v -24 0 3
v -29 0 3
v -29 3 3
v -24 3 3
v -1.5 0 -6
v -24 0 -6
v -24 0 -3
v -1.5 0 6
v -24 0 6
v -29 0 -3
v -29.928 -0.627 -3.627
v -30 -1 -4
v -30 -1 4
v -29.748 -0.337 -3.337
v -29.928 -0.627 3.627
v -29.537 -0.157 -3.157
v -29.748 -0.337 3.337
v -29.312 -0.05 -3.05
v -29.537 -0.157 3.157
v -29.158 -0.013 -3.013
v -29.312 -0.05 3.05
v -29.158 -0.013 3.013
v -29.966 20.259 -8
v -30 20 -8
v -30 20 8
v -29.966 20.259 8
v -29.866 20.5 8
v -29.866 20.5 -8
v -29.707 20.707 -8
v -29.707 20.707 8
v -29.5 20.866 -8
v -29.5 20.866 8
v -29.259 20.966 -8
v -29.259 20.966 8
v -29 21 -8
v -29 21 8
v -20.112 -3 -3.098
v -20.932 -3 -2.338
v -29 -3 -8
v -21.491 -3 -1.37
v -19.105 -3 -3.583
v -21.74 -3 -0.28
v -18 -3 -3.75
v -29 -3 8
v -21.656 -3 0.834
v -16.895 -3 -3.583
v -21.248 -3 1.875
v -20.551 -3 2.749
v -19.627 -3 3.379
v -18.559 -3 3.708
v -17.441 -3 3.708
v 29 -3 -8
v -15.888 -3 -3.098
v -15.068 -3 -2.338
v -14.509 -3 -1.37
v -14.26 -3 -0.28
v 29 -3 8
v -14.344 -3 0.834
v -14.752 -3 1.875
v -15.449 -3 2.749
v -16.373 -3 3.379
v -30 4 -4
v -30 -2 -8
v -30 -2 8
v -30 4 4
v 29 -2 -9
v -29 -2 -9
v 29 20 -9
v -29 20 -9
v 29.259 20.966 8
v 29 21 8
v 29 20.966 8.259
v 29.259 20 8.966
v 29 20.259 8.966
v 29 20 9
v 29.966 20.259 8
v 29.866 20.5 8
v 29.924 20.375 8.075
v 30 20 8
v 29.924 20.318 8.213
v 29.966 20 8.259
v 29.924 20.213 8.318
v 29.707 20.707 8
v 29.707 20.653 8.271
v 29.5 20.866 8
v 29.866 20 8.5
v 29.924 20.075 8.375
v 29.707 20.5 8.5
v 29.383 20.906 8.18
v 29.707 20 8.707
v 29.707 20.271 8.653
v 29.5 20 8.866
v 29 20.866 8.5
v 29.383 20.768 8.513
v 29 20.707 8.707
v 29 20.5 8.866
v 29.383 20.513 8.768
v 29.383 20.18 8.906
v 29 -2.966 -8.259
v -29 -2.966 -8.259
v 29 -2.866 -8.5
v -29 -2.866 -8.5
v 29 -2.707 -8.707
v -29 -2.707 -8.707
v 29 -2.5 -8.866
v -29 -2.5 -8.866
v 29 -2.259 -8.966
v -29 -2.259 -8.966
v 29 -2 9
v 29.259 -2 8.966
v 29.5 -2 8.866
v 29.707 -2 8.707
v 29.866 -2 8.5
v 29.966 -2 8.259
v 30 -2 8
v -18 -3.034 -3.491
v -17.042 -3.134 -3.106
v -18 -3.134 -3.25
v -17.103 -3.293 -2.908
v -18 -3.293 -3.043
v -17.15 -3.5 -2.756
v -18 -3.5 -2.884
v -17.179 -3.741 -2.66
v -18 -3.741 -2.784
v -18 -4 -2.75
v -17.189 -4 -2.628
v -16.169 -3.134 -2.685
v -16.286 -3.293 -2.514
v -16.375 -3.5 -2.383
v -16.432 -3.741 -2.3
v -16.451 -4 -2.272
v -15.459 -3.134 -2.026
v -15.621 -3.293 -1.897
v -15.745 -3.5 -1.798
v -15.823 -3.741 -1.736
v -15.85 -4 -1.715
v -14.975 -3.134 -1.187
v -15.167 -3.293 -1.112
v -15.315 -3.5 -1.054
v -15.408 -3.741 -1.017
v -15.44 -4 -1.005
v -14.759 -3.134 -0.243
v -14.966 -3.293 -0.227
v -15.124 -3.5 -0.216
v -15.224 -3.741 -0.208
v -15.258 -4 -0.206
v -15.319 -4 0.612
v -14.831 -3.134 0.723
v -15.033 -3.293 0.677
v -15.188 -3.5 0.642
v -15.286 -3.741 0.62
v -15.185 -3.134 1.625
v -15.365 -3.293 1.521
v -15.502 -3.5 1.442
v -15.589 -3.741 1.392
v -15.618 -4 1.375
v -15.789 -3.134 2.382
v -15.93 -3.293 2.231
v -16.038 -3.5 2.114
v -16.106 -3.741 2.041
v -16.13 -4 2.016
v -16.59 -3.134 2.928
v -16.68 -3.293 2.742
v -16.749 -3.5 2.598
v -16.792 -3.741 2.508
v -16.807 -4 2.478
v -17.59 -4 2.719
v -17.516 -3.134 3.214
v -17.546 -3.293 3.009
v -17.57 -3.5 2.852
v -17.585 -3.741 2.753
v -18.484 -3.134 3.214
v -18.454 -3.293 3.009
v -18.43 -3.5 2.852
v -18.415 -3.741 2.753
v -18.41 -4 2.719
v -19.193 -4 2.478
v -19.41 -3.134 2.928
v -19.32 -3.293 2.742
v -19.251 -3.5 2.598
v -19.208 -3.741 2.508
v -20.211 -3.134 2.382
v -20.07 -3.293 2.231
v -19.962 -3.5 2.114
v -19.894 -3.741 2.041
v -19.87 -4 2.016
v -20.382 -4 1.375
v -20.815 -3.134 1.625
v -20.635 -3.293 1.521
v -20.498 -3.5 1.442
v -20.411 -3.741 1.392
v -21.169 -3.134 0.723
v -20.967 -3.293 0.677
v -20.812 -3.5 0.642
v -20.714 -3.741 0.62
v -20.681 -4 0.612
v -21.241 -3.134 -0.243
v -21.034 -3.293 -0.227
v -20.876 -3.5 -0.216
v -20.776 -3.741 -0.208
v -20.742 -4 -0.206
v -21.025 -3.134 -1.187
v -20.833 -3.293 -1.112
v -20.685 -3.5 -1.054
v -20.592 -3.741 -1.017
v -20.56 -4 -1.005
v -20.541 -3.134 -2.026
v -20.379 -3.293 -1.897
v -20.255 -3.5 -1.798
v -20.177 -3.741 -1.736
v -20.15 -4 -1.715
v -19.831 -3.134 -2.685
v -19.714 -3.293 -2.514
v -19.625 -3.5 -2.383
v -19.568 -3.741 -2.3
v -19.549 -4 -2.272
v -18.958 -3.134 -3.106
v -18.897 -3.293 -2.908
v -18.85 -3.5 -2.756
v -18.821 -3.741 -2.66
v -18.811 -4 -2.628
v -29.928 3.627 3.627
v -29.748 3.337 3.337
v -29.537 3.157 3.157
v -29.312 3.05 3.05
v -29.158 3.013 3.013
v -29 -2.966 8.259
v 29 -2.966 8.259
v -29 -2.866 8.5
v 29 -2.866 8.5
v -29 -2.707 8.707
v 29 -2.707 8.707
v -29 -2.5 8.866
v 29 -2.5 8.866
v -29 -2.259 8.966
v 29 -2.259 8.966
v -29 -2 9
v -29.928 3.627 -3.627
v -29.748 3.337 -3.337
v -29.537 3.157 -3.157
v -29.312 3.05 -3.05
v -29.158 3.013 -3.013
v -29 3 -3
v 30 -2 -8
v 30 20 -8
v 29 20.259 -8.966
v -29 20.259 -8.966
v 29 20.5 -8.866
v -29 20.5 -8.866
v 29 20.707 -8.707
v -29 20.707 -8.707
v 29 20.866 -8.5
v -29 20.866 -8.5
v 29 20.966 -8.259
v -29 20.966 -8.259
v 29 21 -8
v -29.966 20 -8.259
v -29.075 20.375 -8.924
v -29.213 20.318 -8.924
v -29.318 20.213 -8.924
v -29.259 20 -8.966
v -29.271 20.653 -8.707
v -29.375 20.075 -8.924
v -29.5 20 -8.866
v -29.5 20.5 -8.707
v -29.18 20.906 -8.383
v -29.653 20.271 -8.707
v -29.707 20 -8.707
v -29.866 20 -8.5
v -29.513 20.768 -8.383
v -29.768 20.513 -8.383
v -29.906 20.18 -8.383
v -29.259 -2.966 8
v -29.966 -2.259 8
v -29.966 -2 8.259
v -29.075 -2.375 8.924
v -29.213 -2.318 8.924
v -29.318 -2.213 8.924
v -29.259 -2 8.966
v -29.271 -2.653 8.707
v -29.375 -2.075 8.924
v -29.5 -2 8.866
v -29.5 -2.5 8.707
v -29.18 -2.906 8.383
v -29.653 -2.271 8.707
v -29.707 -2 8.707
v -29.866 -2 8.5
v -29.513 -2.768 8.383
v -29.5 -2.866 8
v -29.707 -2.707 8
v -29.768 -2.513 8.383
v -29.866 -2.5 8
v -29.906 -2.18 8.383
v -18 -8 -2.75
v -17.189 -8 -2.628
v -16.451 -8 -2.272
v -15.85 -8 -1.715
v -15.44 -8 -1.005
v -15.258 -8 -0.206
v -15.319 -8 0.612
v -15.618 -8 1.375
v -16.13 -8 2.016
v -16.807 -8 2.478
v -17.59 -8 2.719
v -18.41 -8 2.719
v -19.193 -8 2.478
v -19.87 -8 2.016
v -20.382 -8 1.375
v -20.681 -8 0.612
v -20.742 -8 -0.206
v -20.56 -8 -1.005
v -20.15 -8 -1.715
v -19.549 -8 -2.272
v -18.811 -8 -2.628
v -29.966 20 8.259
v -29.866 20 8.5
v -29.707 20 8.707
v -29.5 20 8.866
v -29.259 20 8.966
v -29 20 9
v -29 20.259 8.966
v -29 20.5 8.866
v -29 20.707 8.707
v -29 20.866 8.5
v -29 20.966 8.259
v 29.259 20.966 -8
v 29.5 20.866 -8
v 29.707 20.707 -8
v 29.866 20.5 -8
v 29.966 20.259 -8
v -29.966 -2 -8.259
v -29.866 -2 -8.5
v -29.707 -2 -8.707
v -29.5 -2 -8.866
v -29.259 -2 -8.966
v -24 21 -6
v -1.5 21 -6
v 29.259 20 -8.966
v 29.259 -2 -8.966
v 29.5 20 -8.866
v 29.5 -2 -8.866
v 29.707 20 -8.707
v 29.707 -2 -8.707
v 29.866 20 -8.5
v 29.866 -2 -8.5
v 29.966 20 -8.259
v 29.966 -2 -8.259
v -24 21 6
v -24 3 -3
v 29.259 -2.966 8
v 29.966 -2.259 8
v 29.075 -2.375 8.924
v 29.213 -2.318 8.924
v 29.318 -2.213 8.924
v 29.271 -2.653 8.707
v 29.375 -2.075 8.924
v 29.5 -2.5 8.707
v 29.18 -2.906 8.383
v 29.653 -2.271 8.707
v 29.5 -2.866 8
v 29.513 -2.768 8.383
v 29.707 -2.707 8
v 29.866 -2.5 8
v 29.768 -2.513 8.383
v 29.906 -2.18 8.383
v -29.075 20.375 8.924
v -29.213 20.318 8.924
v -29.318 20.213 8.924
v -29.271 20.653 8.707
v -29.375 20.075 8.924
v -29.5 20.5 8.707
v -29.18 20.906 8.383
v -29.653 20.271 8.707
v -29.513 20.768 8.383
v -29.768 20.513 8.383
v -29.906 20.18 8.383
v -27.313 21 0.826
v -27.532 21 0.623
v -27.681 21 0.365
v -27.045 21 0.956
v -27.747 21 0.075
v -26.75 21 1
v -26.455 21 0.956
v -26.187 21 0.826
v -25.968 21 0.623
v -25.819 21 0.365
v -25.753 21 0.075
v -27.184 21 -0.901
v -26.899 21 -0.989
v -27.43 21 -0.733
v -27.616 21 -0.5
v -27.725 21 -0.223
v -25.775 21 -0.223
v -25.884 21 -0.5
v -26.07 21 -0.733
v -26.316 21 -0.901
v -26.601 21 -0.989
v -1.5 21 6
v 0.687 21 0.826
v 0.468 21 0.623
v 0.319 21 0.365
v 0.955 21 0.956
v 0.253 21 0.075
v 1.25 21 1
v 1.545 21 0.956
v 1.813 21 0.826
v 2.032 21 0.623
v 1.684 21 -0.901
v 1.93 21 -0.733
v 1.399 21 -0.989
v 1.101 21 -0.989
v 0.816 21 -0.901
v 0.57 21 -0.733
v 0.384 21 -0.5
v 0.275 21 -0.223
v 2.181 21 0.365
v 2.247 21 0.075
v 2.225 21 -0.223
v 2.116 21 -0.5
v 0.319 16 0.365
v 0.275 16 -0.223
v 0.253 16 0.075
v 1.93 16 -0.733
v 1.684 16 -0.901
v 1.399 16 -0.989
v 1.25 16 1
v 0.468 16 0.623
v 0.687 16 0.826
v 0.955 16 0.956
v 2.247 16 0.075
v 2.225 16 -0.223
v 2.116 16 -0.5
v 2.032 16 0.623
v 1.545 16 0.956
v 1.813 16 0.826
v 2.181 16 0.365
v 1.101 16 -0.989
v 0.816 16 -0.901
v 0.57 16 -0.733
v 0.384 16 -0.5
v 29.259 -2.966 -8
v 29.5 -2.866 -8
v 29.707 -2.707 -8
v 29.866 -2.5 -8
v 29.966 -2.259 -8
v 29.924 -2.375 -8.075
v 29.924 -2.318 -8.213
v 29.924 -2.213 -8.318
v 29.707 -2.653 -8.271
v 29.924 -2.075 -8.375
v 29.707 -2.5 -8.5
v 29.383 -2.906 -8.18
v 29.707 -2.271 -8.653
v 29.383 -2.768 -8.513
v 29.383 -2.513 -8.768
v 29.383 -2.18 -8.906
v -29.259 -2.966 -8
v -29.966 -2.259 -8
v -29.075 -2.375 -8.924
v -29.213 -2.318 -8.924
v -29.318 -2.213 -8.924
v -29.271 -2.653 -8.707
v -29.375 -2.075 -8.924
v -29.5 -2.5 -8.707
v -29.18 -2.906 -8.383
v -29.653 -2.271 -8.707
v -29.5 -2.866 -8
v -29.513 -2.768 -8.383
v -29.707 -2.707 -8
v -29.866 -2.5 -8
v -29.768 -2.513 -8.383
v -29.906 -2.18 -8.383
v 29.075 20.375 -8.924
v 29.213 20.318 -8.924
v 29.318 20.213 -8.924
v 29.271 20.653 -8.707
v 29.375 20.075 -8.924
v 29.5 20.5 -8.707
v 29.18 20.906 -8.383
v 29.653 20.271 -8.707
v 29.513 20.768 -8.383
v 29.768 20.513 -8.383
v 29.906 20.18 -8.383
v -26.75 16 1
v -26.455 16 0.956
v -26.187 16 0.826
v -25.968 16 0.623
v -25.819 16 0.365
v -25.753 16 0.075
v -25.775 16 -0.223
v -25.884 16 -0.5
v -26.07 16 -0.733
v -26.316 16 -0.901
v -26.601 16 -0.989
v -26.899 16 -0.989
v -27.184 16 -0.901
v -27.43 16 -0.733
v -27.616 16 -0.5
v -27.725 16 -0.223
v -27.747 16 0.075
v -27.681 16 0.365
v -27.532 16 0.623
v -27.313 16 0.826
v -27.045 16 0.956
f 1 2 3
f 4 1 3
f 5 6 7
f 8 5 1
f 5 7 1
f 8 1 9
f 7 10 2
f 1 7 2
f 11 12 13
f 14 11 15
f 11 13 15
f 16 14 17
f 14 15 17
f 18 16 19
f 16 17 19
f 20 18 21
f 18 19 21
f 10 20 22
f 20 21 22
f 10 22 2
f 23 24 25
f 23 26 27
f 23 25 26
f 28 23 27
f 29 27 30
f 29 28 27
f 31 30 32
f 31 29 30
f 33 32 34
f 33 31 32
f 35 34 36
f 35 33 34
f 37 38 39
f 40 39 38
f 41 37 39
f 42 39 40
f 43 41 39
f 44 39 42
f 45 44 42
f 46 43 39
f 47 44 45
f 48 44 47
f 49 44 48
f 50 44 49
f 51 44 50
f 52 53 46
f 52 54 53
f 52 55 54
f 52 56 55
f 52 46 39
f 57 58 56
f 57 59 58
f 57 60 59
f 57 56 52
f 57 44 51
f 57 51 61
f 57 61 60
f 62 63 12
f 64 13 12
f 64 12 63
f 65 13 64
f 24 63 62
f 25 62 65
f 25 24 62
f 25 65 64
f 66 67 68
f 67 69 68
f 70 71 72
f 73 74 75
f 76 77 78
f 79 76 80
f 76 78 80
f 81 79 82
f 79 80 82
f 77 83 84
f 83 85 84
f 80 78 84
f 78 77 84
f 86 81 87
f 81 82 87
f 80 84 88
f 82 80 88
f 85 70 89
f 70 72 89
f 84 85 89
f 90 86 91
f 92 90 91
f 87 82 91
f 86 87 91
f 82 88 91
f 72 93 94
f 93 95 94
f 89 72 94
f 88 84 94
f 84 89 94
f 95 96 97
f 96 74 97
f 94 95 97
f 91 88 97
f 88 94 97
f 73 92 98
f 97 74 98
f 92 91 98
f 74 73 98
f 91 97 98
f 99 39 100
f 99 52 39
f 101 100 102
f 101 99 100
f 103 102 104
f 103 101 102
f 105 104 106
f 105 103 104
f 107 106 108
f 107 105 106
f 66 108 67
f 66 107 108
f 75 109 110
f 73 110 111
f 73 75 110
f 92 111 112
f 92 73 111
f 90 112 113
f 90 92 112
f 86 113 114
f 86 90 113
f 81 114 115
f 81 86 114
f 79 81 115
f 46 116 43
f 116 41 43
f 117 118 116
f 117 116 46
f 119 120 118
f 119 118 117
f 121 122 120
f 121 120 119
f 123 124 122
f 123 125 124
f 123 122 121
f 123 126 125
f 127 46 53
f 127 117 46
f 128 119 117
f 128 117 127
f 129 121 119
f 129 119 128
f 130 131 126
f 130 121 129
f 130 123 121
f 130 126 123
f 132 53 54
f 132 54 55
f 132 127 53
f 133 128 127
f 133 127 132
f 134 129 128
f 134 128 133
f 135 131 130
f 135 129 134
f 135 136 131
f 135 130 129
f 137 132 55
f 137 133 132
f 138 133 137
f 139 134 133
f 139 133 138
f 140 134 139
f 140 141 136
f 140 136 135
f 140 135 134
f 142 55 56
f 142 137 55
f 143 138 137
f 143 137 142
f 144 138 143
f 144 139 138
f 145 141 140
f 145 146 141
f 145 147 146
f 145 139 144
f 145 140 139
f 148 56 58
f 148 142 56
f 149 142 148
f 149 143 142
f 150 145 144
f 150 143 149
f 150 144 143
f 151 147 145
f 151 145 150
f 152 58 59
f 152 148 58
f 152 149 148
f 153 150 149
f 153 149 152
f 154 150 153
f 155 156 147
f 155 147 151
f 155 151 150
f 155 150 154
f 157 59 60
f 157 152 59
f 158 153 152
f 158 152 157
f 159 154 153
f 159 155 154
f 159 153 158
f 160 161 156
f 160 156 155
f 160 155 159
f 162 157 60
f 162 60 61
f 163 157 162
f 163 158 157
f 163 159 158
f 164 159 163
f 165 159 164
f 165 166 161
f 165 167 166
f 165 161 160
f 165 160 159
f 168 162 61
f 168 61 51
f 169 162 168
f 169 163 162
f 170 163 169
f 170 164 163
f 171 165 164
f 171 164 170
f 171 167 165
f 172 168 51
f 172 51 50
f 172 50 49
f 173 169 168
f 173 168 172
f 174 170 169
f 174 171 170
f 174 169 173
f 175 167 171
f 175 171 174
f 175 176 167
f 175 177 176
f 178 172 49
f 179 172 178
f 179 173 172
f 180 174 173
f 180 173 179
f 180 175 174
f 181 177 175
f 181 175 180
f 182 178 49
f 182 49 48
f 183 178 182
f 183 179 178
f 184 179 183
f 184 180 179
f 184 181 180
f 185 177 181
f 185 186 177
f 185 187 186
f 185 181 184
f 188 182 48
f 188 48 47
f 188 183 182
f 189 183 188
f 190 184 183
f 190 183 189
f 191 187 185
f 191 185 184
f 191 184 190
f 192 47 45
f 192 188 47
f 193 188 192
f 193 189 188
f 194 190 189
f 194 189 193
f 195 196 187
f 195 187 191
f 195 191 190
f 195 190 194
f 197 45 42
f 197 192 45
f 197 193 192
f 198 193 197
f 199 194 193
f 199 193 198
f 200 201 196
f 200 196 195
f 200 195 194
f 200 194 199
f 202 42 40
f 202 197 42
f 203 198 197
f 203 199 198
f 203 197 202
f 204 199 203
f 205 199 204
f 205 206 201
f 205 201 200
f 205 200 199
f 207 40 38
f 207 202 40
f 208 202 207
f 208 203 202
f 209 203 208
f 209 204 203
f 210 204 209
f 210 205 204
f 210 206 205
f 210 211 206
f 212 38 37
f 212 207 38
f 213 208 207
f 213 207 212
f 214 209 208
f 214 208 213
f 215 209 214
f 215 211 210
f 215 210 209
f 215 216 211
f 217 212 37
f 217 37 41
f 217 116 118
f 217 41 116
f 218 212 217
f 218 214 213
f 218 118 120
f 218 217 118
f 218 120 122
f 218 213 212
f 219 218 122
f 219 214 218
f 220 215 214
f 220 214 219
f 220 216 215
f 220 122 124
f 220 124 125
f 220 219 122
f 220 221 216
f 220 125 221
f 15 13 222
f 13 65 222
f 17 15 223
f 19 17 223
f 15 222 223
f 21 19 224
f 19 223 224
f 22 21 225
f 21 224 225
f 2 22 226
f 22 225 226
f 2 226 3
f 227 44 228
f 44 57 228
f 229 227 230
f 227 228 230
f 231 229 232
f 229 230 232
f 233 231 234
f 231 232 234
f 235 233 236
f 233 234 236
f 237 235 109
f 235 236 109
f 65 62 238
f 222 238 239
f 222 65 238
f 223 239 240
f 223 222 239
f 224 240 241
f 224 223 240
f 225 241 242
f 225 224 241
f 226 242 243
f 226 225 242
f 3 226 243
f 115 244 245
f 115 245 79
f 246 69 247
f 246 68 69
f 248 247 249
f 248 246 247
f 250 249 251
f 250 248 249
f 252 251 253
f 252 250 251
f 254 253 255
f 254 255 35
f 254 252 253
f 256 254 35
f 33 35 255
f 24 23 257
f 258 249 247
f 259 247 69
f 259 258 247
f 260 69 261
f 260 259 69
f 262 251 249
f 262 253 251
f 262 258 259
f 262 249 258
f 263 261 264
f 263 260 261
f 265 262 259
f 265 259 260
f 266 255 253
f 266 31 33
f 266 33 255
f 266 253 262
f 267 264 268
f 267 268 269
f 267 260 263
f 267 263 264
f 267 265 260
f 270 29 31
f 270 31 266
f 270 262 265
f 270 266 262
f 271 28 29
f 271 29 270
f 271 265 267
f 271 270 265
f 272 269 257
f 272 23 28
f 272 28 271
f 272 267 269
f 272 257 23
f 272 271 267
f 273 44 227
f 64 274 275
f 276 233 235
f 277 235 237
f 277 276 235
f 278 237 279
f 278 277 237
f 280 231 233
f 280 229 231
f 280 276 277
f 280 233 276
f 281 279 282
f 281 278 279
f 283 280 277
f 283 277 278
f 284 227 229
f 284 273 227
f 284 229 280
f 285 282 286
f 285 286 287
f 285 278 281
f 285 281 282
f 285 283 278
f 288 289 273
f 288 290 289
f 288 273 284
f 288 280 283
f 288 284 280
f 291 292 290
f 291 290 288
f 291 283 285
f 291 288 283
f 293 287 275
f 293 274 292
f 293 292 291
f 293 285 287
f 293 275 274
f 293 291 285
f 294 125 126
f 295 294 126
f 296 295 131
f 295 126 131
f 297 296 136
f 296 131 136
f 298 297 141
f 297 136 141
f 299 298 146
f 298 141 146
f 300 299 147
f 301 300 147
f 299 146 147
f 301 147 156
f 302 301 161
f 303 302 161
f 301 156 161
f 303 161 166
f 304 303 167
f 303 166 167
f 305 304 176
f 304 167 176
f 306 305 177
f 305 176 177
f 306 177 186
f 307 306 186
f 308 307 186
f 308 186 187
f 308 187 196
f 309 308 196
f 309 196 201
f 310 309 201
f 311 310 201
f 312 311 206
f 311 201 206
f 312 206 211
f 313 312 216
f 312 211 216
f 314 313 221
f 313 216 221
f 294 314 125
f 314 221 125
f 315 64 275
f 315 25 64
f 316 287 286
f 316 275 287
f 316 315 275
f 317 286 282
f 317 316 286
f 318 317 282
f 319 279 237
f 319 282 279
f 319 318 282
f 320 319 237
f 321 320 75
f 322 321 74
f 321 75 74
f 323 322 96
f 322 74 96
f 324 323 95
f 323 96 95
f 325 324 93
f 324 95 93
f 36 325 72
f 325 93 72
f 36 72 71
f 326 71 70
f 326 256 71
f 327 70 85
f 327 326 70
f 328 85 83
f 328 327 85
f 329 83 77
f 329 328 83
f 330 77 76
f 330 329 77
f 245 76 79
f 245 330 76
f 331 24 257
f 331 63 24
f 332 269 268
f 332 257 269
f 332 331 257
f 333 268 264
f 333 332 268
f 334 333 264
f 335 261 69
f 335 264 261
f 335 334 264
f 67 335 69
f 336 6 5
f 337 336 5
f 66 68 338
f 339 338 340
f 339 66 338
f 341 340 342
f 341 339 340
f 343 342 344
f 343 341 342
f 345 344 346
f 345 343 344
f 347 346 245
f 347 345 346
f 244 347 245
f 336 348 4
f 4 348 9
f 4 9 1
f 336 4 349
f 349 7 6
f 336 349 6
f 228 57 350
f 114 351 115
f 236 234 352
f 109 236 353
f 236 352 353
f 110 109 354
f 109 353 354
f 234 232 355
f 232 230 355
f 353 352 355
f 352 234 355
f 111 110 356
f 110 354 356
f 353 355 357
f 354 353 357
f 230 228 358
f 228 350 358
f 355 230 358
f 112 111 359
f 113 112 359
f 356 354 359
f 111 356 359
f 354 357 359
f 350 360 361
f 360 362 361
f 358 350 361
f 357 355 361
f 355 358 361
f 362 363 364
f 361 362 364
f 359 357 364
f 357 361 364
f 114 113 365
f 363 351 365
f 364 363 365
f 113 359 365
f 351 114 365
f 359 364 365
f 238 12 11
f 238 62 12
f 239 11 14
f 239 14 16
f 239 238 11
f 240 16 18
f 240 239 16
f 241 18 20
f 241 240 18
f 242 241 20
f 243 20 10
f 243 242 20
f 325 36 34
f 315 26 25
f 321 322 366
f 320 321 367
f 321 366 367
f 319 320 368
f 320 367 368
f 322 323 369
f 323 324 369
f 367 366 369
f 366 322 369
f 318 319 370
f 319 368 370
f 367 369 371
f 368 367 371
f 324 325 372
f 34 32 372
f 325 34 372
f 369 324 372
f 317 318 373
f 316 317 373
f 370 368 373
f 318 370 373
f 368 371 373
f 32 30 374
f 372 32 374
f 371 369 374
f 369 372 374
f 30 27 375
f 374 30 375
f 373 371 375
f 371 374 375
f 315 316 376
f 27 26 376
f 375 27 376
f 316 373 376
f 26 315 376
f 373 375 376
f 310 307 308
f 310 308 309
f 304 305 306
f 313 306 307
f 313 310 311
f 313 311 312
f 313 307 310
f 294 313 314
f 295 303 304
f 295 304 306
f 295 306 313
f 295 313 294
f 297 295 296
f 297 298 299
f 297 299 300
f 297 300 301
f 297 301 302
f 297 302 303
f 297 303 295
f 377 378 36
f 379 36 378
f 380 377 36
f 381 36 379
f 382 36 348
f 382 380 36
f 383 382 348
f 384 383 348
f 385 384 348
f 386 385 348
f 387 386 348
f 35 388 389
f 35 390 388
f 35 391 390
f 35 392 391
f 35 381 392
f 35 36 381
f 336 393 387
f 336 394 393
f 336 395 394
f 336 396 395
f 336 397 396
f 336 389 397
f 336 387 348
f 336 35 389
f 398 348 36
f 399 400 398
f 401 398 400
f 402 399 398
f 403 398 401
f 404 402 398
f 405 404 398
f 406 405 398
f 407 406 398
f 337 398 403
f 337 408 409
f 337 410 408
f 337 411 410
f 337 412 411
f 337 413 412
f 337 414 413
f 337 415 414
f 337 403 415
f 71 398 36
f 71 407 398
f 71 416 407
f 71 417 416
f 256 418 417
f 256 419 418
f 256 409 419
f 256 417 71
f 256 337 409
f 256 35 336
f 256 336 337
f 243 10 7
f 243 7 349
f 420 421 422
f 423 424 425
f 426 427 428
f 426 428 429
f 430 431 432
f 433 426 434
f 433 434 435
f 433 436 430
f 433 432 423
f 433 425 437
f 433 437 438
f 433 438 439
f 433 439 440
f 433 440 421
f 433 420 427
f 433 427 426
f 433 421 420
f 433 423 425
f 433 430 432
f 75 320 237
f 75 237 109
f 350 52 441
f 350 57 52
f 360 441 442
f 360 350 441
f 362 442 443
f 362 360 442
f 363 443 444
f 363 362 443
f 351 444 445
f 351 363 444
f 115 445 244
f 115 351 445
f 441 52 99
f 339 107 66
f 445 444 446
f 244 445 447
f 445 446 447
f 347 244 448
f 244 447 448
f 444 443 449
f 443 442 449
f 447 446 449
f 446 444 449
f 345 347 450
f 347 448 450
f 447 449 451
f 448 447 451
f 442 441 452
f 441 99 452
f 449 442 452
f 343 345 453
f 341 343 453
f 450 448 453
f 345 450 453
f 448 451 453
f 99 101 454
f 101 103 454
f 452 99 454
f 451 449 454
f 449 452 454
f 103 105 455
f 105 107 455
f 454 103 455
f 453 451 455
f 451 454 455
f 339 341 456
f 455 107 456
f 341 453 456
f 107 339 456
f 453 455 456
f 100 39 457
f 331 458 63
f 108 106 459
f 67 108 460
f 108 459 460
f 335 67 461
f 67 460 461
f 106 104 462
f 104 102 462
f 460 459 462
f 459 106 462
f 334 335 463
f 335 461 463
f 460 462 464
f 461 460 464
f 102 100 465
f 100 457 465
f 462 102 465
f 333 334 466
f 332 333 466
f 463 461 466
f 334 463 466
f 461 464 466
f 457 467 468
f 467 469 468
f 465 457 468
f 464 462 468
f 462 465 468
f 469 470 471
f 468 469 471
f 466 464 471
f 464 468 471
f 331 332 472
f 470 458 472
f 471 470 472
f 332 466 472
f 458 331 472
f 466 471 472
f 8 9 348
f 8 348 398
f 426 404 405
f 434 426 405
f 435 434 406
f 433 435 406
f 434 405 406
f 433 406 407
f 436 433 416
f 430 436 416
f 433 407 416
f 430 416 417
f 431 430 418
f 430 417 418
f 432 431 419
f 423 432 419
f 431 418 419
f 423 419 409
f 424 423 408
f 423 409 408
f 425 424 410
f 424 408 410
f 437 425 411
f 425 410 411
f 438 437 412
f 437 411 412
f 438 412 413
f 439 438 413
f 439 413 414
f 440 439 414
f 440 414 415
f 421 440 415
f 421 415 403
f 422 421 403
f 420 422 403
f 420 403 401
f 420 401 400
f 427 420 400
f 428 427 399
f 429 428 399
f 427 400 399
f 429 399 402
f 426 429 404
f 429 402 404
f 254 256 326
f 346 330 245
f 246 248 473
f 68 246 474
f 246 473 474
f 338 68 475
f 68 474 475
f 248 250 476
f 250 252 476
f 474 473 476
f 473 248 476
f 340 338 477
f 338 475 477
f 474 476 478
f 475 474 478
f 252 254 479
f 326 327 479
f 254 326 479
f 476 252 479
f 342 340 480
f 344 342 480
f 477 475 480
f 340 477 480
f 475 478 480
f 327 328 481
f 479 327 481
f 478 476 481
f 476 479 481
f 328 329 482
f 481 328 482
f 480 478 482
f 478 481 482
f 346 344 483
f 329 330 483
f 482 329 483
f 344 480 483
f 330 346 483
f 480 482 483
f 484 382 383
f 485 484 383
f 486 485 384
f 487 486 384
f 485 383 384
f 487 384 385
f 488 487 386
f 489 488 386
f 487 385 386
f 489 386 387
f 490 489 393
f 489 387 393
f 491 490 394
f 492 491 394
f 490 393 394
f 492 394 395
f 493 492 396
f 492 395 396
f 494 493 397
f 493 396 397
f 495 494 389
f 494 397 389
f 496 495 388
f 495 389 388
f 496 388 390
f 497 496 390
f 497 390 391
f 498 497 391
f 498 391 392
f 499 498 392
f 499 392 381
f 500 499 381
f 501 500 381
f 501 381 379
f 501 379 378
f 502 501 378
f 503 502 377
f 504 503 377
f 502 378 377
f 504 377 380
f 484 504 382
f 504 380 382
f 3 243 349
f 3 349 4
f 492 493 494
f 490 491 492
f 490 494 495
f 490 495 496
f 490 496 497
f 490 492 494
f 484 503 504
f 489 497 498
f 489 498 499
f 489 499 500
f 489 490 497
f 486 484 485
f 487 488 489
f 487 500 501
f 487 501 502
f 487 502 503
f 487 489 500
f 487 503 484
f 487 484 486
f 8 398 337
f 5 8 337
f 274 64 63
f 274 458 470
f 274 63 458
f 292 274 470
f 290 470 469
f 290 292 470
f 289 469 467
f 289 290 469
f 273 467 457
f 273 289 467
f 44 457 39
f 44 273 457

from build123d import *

# Parameters (mm, degrees)
SKETCH_1_W          = 60
SKETCH_1_H          = 18
SKETCH_1_W_2        = 22.5
SKETCH_1_H_2        = 12
EXTRUDE_1_DEPTH     = 21
SKETCH_2_W          = 60
SKETCH_2_H          = 18
EXTRUDE_2_DEPTH     = 3
SKETCH_3_W          = 6
SKETCH_3_H          = 3
CUT_EXTRUDE_1_DEPTH = 6
SKETCH_4_R          = 2.75
EXTRUDE_3_DEPTH     = 5
SKETCH_6_R          = 1
CUT_EXTRUDE_2_DEPTH = 5
FILLET_1_R          = 1


with BuildPart() as part:
    # 草图1 → 凸台-拉伸1 (new body)
    with BuildSketch(Plane(origin=(0, 0, 0), x_dir=(1, 0, 0), z_dir=(0, 1, 0))):
        Rectangle(SKETCH_1_W, SKETCH_1_H)
        with Locations((-12.75, 0)):
            Rectangle(SKETCH_1_W_2, SKETCH_1_H_2, mode=Mode.SUBTRACT)
    extrude(amount=EXTRUDE_1_DEPTH)

    # 草图2 → 凸台-拉伸2 (add)
    with BuildSketch(Plane.XZ):
        Rectangle(SKETCH_2_W, SKETCH_2_H)
    extrude(amount=EXTRUDE_2_DEPTH)

    # 草图3 → 切除-拉伸1 (cut)
    with BuildSketch(Plane.ZY.offset(30)):
        with Locations((0, 1.5)):
            Rectangle(SKETCH_3_W, SKETCH_3_H)
    extrude(amount=-CUT_EXTRUDE_1_DEPTH, mode=Mode.SUBTRACT)

    # 草图4 → 凸台-拉伸3 (add)
    with BuildSketch(Plane.XZ.offset(3)):
        with Locations(Location((-18, 0, 0), (0, 0, 270))):
            Circle(SKETCH_4_R)
    extrude(amount=EXTRUDE_3_DEPTH)

    # 草图6 → 切除-拉伸2 (cut)
    with BuildSketch(Plane(origin=(0, 21, 0), x_dir=(1, 0, 0), z_dir=(0, 1, 0))):
        with Locations(Location((-26.75, 0, 0), (0, 0, 270))):
            Circle(SKETCH_6_R)
        with Locations(Location((1.25, 0, 0), (0, 0, 270))):
            Circle(SKETCH_6_R)
    extrude(amount=-CUT_EXTRUDE_2_DEPTH, mode=Mode.SUBTRACT)

    # 圆角1
    fillet_1_edges = [part.edges().sort_by_distance(p)[0] for p in [
        (-30, 21, 0),
        (0, 21, 9),
        (-30, -3, 0),
        (0, -3, -9),
        (30, -3, 0),
        (0, -3, 9),
        (30, 21, 0),
        (-30, 1.5, -3),
        (-30, 0, 0),
        (-30, 1.5, 3),
        (-30, 3, 0),
        (-18, -3, 2.75),
        (0, 21, -9),
        (30, 9, 9),
        (-30, 9, 9),
        (-30, 9, -9),
        (30, 9, -9),
    ]]
    fillet(fillet_1_edges, radius=FILLET_1_R)


solid = part.part
